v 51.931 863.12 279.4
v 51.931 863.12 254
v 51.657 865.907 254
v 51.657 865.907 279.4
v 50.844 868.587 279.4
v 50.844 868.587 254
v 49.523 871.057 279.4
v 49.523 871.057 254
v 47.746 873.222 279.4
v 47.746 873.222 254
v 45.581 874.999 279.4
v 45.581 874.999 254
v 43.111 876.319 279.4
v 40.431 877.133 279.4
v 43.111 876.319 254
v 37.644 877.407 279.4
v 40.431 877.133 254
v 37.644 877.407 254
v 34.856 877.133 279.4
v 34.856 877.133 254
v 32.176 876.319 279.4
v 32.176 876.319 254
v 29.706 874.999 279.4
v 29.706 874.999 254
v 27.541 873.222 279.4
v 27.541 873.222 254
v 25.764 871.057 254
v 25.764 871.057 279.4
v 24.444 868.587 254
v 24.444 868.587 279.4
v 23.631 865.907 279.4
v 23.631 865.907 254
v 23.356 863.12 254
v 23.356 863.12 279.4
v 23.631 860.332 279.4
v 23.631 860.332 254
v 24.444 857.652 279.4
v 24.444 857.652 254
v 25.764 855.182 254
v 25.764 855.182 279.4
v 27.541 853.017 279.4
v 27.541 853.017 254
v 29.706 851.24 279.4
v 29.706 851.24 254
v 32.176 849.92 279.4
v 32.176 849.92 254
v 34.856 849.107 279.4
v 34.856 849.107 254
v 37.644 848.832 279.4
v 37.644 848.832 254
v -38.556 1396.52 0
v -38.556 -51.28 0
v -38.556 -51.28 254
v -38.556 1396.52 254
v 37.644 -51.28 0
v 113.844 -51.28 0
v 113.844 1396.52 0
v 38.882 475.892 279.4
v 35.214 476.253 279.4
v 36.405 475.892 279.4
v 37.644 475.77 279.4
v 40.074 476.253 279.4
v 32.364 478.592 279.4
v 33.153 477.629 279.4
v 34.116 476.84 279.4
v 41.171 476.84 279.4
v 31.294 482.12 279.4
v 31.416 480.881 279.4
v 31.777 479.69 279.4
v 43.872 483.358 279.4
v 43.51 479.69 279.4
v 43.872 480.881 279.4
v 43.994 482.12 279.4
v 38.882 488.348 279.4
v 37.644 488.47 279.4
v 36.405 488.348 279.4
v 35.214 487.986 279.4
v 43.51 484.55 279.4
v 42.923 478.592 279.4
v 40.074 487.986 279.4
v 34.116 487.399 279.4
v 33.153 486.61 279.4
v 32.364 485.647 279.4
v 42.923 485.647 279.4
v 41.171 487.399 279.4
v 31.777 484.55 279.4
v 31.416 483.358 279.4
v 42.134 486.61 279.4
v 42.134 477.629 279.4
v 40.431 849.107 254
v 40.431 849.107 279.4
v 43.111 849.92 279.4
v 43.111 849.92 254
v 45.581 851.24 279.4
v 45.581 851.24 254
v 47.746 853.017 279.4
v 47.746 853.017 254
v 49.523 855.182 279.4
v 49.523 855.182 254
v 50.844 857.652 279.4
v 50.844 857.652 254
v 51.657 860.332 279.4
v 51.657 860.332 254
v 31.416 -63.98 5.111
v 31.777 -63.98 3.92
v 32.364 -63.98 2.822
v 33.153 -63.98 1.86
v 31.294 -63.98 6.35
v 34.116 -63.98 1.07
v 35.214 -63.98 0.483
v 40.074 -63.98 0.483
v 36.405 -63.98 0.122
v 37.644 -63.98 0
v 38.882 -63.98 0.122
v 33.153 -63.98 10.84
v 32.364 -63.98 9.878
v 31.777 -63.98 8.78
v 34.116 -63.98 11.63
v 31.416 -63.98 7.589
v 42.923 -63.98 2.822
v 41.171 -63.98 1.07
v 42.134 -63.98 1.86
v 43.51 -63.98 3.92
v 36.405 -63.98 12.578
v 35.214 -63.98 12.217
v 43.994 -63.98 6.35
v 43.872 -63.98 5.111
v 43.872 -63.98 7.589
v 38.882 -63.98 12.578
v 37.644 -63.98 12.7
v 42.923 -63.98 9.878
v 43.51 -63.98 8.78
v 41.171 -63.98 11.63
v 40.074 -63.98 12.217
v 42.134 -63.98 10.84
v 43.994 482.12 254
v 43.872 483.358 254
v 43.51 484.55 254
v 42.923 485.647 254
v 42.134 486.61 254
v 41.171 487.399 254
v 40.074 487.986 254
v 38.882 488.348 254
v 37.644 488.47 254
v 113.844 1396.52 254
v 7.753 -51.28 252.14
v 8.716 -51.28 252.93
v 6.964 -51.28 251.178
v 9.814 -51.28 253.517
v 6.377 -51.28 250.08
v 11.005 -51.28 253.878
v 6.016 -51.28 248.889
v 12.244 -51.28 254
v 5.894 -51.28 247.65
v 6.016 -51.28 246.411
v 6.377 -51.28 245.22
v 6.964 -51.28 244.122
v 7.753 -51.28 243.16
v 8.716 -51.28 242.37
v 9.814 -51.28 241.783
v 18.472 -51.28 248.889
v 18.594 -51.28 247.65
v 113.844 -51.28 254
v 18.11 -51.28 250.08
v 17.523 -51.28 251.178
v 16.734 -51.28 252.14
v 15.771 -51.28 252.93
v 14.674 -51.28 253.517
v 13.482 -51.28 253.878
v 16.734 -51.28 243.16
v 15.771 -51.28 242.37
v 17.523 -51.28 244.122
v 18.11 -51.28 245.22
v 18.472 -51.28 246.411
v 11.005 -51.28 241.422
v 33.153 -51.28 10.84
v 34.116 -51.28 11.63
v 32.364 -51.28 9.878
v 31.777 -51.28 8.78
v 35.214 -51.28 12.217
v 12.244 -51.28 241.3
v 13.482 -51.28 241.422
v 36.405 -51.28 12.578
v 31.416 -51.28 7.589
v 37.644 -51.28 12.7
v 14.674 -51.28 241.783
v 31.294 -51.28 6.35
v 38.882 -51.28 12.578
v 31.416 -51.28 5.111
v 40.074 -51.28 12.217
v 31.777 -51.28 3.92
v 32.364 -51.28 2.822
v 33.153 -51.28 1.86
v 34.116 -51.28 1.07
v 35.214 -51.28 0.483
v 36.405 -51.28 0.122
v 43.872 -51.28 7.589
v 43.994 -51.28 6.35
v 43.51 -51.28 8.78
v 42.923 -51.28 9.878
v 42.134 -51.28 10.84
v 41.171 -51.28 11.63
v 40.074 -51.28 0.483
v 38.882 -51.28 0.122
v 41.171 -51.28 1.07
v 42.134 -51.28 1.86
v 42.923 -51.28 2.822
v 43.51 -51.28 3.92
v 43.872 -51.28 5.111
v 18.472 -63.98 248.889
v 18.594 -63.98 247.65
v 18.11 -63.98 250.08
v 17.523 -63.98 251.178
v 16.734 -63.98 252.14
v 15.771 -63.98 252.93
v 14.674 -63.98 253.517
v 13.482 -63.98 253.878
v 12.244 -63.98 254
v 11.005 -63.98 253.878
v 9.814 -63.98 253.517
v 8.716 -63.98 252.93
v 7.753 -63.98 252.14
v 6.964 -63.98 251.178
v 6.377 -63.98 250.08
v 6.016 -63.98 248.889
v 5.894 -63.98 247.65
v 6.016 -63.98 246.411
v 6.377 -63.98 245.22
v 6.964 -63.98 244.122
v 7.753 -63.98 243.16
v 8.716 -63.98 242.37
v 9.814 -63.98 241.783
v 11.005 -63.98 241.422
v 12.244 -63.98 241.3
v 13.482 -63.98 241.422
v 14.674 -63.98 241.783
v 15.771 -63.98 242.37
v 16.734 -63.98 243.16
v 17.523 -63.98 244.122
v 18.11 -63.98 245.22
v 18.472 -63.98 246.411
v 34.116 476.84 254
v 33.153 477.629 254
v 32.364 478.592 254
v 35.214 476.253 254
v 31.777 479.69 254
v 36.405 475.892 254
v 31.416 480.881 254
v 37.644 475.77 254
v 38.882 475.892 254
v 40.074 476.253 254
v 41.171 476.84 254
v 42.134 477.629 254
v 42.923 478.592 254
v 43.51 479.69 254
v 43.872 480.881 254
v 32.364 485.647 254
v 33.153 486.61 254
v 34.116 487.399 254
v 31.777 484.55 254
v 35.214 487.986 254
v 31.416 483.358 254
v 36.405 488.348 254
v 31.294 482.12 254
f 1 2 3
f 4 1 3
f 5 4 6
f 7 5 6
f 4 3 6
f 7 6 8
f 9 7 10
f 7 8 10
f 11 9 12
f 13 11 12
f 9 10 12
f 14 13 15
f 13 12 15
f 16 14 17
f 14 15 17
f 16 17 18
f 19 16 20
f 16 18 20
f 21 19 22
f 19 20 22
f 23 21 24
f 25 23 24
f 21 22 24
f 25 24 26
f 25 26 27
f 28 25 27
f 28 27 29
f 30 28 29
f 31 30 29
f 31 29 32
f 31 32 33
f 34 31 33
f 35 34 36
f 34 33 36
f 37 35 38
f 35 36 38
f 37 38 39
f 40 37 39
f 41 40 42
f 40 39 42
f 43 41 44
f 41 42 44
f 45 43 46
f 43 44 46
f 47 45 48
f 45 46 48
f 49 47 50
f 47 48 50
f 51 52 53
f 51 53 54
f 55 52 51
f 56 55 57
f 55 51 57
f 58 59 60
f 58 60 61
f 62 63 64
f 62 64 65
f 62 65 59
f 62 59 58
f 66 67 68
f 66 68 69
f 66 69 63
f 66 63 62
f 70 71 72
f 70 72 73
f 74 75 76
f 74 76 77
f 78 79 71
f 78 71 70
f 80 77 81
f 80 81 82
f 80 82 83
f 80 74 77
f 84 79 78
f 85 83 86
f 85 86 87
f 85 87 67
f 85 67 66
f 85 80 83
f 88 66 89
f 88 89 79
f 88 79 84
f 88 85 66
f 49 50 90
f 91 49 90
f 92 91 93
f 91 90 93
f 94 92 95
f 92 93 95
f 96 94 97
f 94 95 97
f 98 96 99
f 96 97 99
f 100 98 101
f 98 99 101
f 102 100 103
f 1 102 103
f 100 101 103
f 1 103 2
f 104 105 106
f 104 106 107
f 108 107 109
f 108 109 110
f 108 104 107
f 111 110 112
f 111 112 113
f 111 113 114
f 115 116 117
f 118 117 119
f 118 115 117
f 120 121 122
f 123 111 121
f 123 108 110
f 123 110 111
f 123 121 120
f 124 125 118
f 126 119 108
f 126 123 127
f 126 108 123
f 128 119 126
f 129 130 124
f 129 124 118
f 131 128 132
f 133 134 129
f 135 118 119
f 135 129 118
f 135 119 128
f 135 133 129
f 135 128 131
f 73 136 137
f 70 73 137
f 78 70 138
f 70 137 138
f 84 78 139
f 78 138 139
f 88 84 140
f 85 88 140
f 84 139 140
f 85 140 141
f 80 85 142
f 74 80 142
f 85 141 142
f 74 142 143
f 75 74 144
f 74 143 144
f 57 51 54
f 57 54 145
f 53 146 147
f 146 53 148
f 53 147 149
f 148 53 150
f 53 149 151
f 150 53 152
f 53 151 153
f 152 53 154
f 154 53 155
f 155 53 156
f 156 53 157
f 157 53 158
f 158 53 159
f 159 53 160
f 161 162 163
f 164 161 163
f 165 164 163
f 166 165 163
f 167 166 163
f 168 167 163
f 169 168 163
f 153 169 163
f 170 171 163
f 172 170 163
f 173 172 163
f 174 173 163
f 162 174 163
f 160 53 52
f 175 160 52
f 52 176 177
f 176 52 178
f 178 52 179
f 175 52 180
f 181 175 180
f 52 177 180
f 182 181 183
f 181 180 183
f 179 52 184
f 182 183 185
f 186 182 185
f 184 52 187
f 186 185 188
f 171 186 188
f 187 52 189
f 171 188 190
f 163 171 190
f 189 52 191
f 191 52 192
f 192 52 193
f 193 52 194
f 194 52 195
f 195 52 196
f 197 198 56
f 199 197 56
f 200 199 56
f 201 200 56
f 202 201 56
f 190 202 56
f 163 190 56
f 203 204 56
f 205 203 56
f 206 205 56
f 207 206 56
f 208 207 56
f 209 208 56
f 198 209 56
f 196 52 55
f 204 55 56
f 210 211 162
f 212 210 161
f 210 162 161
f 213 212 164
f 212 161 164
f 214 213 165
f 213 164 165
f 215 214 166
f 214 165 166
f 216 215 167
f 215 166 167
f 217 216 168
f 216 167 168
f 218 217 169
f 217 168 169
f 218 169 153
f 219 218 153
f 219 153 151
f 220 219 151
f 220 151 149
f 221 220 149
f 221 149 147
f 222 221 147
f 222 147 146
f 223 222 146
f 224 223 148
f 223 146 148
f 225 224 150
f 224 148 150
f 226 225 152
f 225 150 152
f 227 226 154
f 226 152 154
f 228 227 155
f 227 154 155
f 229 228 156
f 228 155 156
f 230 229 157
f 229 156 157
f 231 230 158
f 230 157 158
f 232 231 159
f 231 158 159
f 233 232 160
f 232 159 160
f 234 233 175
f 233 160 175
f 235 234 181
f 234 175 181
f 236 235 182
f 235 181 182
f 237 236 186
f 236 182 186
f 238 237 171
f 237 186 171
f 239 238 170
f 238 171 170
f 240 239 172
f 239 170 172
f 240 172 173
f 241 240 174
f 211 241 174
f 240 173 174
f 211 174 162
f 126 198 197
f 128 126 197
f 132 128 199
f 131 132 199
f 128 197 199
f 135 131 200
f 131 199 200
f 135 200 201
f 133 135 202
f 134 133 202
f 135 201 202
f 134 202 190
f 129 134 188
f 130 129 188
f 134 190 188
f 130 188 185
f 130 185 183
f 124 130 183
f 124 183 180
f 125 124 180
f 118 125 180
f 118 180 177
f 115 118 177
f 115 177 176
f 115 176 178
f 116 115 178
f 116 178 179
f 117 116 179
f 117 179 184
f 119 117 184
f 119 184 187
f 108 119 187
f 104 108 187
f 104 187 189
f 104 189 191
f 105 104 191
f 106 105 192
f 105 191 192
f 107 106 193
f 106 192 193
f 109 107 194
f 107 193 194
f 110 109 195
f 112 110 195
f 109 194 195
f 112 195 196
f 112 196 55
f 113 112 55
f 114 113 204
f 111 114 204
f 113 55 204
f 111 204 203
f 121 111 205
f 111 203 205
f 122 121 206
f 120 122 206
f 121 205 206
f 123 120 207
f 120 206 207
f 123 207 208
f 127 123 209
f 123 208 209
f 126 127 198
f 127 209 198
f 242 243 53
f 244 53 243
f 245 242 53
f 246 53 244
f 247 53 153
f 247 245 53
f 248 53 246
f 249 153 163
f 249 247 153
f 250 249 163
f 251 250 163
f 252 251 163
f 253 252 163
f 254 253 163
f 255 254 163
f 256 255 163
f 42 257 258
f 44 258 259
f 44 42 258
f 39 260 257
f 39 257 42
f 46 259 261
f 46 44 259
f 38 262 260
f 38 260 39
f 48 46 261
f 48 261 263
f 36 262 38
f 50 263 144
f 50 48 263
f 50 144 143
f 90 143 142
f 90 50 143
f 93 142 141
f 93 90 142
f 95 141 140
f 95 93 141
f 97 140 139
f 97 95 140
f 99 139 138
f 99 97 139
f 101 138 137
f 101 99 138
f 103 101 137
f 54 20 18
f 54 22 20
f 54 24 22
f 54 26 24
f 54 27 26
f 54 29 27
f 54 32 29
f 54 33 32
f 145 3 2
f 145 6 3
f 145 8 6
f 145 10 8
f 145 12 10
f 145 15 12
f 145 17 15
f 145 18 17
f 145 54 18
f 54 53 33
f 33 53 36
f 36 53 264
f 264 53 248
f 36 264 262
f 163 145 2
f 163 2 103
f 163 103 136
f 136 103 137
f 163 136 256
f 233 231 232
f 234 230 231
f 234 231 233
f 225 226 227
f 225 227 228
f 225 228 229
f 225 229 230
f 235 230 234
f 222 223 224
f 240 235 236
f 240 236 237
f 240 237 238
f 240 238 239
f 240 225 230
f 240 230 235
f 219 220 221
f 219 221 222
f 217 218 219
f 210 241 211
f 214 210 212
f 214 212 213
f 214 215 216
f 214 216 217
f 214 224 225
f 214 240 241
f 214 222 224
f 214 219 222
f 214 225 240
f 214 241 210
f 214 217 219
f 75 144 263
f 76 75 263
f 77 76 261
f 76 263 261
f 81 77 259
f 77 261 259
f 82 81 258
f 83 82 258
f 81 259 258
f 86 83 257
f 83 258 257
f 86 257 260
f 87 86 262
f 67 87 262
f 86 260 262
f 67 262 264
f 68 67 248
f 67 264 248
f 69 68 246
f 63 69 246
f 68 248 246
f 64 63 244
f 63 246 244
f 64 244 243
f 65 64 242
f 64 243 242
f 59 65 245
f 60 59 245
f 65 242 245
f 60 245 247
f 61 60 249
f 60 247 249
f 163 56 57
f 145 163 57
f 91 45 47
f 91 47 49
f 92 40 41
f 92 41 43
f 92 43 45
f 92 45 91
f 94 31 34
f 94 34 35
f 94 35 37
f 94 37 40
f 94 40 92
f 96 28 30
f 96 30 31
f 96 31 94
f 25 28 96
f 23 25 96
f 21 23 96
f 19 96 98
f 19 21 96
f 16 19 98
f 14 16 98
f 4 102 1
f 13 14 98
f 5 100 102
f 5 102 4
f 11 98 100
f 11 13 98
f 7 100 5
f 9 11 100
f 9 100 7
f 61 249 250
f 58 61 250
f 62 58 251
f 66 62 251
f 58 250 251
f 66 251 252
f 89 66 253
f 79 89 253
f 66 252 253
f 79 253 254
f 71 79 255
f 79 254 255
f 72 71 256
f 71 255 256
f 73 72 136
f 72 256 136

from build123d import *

# Parameters (mm, degrees)
F0_W     = 152.4
F0_H     = 1447.8
F1_DEPTH = 254
F3_DEPTH = 25.4
F4_R     = 6.35
F5_DEPTH = 12.7


with BuildPart() as f1:
    # F0 (on Top) → F1 (new body)
    with BuildSketch(Plane.XY):
        with Locations((37.643603, 672.619554)):
            Rectangle(F0_W, F0_H)
    extrude(amount=F1_DEPTH)

    # F2 (on face) → F3 (join)
    with BuildSketch(Plane.XY.offset(254)):
        with BuildLine():
            ThreePointArc((37.643603, 475.769554), (42.133731, 477.629426), (43.993603, 482.119554))
            ThreePointArc((43.993603, 482.119554), (42.133731, 486.609682), (37.643603, 488.469554))
            Line((37.643603, 488.469554), (37.643603, 475.769554))
        make_face()
        with BuildLine():
            ThreePointArc((51.931103, 863.119554), (27.540815, 873.222342), (37.643603, 848.832054))
            ThreePointArc((37.643603, 848.832054), (47.746391, 853.016766), (51.931103, 863.119554))
        make_face()
        with BuildLine():
            Line((37.643603, 475.769554), (37.643603, 488.469554))
            ThreePointArc((37.643603, 488.469554), (31.293603, 482.119554), (37.643603, 475.769554))
        make_face()
    extrude(amount=F3_DEPTH)

    # F4 (on face) → F5 (join)
    with BuildSketch(Plane.XZ.offset(51.280446)):
        with Locations((37.643603, 6.35)):
            Circle(F4_R)
        with BuildLine():
            ThreePointArc((5.893603, 247.65), (12.243603, 241.3), (18.593603, 247.65))
            ThreePointArc((18.593603, 247.65), (12.243603, 254), (5.893603, 247.65))
        make_face()
    extrude(amount=F5_DEPTH)


solid = f1.part
